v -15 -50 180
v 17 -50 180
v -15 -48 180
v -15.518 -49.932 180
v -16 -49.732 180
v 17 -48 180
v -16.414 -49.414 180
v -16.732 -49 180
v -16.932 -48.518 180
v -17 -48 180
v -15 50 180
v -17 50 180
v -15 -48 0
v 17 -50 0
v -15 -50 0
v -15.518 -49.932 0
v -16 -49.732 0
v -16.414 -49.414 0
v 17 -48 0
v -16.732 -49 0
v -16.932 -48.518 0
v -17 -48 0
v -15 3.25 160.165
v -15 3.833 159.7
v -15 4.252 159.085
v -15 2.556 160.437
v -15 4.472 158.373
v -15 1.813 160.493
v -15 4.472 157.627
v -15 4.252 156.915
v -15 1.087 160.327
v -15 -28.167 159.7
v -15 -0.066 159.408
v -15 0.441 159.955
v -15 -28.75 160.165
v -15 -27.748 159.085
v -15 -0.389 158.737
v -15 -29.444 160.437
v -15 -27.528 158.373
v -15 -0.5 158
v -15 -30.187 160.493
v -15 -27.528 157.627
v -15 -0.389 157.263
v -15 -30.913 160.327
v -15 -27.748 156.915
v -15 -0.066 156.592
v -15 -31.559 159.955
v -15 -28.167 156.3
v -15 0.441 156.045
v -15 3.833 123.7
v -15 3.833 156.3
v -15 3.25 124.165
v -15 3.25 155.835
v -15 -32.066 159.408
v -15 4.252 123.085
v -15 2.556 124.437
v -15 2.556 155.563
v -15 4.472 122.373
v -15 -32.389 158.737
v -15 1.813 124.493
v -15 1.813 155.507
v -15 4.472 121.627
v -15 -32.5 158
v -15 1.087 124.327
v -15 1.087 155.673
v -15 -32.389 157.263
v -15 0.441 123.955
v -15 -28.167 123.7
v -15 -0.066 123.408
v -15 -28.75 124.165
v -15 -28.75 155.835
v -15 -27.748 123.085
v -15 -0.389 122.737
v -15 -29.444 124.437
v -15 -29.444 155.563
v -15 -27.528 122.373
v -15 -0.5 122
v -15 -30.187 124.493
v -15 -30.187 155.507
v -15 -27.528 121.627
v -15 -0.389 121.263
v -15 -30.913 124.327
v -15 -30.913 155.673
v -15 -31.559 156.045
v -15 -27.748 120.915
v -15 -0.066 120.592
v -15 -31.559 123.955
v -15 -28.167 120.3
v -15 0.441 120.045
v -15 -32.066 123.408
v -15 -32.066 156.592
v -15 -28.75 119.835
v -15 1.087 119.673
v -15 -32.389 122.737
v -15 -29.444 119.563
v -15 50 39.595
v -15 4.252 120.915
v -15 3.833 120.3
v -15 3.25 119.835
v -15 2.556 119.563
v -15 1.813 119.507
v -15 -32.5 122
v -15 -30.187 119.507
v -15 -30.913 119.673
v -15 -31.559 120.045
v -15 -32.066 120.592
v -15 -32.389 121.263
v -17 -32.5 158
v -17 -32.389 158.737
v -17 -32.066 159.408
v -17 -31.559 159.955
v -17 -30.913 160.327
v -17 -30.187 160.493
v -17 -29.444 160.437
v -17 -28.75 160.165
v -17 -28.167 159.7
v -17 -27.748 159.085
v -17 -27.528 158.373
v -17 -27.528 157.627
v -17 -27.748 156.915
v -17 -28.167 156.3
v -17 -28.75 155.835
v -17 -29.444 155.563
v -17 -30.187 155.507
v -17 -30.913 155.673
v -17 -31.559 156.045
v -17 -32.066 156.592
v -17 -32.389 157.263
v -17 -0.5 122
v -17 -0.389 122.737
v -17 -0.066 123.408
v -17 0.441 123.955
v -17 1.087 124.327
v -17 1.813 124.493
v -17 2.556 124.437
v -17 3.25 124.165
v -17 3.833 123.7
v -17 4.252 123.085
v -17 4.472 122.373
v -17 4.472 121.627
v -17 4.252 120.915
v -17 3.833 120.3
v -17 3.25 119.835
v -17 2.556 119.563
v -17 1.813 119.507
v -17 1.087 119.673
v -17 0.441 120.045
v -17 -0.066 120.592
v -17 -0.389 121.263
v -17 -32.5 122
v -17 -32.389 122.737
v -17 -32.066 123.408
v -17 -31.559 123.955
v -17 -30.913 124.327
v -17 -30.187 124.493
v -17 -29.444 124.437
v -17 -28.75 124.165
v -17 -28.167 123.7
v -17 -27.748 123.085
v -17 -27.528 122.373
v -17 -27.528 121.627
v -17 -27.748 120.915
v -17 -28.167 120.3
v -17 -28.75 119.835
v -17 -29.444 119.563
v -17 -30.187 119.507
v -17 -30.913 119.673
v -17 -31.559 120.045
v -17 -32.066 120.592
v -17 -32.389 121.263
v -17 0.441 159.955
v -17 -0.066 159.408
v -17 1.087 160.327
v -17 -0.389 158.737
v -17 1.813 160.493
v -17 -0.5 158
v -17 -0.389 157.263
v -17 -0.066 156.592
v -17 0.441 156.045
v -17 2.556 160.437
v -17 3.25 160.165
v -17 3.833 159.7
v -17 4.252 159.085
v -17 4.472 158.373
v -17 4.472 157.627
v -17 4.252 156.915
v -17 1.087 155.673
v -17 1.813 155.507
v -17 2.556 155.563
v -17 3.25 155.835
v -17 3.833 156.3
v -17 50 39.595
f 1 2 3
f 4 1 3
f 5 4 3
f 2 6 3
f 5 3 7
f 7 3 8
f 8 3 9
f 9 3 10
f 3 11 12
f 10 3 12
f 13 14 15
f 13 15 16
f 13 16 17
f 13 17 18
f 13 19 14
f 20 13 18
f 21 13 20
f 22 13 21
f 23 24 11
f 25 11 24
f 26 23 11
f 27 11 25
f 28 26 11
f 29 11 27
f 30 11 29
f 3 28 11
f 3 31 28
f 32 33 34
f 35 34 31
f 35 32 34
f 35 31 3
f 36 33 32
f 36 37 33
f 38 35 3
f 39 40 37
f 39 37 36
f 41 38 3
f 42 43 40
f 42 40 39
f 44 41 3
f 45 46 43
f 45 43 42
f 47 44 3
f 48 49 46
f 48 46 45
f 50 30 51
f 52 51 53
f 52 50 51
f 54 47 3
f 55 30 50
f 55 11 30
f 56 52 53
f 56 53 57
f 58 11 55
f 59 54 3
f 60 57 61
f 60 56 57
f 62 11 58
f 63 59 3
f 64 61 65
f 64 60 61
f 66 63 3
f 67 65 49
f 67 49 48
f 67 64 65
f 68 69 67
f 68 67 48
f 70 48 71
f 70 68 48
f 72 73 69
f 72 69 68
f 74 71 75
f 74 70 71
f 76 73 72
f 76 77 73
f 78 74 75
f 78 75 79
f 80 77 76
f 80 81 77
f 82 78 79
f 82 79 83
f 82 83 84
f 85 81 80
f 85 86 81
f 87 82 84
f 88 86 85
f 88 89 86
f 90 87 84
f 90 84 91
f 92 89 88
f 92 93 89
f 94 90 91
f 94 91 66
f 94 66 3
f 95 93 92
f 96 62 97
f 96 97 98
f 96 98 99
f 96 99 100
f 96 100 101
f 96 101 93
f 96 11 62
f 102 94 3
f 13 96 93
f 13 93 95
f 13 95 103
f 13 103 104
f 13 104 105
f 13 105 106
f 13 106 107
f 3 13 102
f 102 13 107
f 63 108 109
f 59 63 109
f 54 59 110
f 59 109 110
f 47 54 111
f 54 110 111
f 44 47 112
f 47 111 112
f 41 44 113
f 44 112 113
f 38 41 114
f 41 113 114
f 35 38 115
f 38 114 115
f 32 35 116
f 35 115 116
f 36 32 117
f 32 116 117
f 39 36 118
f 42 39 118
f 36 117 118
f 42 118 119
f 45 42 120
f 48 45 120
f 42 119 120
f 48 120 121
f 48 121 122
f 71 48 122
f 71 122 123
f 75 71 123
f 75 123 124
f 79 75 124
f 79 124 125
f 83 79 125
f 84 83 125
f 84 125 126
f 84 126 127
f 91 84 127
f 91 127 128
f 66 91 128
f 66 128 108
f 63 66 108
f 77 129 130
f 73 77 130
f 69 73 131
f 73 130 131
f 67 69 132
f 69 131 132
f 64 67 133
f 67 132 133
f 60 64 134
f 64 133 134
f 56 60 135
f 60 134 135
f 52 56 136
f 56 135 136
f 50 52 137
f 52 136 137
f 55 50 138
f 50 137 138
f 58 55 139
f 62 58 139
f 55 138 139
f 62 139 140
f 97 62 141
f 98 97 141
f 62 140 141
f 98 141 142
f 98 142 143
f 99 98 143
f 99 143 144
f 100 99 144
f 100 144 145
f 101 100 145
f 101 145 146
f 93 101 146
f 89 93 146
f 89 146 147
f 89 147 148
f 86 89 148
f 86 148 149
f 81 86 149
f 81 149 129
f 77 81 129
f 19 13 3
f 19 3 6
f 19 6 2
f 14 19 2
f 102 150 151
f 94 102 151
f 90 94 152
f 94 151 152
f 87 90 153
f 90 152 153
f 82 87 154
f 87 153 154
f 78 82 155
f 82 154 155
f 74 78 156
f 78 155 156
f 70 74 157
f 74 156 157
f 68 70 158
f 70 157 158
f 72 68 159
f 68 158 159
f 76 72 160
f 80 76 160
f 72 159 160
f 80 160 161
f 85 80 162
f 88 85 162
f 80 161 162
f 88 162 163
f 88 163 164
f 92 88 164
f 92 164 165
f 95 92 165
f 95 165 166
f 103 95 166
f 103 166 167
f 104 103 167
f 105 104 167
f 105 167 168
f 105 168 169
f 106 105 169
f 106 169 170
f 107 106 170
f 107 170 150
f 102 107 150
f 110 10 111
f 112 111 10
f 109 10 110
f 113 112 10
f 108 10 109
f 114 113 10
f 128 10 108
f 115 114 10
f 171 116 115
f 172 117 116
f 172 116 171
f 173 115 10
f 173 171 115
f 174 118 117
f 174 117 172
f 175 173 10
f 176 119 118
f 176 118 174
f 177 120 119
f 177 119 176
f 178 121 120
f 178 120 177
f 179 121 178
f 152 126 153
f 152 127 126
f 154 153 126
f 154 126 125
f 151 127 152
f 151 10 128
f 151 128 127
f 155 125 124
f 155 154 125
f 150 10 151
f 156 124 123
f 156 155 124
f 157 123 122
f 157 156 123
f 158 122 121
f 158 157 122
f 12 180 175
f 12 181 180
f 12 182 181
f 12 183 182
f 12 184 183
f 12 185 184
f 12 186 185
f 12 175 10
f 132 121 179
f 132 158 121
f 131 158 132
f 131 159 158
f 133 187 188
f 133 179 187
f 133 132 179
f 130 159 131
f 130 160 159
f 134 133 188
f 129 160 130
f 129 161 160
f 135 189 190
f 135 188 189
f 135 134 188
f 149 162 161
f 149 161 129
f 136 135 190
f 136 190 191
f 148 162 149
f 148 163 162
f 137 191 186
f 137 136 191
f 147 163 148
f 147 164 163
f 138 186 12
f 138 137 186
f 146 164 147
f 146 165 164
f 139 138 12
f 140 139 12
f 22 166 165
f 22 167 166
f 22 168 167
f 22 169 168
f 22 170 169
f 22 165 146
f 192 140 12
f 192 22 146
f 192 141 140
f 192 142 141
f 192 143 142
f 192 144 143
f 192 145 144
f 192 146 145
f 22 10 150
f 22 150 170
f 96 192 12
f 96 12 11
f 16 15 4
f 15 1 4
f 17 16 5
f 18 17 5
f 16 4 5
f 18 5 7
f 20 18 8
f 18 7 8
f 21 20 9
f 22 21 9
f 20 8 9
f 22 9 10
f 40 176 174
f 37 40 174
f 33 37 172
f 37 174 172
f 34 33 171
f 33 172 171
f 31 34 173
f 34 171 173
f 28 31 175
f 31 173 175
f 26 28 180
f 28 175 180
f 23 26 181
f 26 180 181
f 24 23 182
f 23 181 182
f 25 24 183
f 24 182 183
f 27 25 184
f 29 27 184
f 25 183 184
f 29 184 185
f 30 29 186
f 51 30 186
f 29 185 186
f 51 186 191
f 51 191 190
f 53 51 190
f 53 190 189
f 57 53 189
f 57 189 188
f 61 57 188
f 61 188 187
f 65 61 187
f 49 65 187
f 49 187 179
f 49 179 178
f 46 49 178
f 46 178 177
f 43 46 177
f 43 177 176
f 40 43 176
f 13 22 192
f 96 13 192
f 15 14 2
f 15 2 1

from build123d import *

# Parameters (mm, degrees)
BOSS_EXTRUDE1_DEPTH = 180
FILLET1_R           = 2
SKETCH2_R           = 2.5
CUT_EXTRUDE1_DEPTH  = 180


with BuildPart() as part:
    # Sketch1 → Boss-Extrude1 (new body)
    with BuildSketch(Plane.XY):
        Polygon((-15, 50), (-15, -48), (17, -48), (17, -50), (-17, -50), (-17, 50), align=None)
    extrude(amount=BOSS_EXTRUDE1_DEPTH)

    # Fillet1
    fillet1_edges = [part.edges().sort_by_distance(p)[0] for p in [
        (-17, -50, 90),
    ]]
    fillet(fillet1_edges, radius=FILLET1_R)

    # Sketch2 → Cut-Extrude1 (cut)
    with BuildSketch(Plane.ZY.offset(17)):
        with Locations(Location((122, 2, 0), (0, 0, 270))):
            Circle(SKETCH2_R)
        with Locations(Location((122, -30, 0), (0, 0, 270))):
            Circle(SKETCH2_R)
        with Locations(Location((158, -30, 0), (0, 0, 270))):
            Circle(SKETCH2_R)
        with Locations(Location((158, 2, 0), (0, 0, 270))):
            Circle(SKETCH2_R)
        Polygon((0, -48), (39.594570132, 50), (0, 50), align=None)
    extrude(amount=-CUT_EXTRUDE1_DEPTH, mode=Mode.SUBTRACT)


solid = part.part
